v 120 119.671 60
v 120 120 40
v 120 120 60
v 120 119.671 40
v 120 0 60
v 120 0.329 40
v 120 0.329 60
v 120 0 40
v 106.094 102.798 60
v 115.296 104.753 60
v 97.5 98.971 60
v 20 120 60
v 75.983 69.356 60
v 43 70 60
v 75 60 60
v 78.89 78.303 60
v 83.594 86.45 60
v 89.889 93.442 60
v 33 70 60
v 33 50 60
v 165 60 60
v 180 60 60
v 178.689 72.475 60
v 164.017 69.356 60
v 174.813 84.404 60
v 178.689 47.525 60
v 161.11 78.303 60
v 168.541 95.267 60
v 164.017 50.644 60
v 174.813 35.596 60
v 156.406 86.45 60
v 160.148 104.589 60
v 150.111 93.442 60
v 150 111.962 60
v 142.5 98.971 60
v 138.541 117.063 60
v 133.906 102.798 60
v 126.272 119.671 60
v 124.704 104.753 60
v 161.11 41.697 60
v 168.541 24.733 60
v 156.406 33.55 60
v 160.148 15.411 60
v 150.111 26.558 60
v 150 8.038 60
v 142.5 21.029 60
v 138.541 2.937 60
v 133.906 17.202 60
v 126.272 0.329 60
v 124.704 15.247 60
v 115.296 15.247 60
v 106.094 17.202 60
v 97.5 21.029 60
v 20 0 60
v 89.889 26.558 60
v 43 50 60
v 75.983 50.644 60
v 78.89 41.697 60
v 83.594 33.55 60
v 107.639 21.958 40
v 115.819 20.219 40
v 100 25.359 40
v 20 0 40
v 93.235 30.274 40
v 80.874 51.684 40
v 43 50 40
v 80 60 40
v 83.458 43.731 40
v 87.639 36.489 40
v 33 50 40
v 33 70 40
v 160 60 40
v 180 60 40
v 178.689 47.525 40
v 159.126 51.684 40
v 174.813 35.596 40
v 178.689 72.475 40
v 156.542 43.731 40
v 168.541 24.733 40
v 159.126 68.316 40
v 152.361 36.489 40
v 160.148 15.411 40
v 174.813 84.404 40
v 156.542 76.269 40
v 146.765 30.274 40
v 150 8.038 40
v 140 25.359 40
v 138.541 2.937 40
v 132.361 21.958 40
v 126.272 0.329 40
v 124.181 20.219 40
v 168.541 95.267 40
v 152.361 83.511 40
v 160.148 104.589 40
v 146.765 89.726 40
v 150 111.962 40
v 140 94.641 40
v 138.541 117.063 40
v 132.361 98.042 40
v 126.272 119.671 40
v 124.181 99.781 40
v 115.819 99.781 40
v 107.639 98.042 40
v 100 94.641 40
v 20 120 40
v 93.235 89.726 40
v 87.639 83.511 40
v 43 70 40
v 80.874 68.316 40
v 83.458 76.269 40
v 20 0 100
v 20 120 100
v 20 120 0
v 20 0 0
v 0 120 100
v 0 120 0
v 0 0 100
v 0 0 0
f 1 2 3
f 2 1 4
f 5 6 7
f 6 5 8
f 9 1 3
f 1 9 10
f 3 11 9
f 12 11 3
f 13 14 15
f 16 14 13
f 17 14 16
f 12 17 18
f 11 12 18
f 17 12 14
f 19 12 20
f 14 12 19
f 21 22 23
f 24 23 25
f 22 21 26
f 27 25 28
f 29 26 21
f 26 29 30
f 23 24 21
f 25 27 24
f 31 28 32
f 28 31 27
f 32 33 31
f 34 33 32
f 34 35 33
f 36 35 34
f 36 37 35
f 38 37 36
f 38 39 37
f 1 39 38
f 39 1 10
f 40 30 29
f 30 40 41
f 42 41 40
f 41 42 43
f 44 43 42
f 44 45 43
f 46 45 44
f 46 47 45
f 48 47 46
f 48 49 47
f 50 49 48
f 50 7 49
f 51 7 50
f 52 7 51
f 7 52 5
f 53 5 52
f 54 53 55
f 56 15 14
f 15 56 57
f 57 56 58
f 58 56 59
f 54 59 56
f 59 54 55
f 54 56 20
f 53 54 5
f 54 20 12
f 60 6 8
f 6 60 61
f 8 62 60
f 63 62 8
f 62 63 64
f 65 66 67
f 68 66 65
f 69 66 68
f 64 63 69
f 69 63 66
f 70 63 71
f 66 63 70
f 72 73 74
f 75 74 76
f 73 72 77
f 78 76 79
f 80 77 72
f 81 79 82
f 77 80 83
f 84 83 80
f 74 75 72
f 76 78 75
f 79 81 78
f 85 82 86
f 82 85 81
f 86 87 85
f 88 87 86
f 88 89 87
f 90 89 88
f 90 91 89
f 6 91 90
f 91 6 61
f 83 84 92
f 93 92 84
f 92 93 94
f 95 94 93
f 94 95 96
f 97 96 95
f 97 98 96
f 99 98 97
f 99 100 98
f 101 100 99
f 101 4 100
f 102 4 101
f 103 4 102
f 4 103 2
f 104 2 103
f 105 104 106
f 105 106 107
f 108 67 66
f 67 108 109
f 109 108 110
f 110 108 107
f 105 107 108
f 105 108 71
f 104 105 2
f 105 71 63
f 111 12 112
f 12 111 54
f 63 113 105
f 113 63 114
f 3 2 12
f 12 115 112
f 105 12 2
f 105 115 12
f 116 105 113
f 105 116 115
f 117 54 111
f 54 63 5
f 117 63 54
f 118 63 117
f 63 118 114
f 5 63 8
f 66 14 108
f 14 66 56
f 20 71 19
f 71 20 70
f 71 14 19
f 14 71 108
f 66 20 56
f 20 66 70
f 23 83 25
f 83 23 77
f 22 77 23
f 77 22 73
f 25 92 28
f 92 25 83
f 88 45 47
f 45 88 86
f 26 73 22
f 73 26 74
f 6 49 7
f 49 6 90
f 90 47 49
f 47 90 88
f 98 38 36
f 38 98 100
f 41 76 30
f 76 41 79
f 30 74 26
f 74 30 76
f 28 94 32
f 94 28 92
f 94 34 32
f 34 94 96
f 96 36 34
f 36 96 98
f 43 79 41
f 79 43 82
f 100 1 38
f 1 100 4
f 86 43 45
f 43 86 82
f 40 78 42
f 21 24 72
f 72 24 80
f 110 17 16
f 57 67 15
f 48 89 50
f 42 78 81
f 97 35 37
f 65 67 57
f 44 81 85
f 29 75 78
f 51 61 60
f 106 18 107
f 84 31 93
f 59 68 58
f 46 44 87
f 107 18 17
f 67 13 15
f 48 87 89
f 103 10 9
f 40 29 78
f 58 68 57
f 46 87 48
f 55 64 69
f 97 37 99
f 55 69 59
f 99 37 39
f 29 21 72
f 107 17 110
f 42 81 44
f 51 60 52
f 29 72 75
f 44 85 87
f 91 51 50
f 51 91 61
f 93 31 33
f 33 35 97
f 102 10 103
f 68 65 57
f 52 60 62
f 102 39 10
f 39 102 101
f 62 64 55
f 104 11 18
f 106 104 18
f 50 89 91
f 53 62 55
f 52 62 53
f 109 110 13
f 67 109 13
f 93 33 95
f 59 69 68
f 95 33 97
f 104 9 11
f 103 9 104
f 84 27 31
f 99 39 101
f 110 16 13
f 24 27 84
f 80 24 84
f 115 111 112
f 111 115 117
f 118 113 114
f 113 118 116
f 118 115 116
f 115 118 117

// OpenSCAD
cube([20,120,100], false);
difference()
{
    union()
    {
        difference()
        {
            translate([20,0,40])
                cube([100,120,20], false);
            translate([33,50,40])
                cube([10,20,20],false);
        }
        translate([120,60,40])
            cylinder(20, 60, 60, false);
    }
    translate([120,60,40])
        cylinder(20, 40, 45, false);
}


/*
translate([33,60,40])
    cylinder(20, 3, 3, false);
*/
//border at 68
